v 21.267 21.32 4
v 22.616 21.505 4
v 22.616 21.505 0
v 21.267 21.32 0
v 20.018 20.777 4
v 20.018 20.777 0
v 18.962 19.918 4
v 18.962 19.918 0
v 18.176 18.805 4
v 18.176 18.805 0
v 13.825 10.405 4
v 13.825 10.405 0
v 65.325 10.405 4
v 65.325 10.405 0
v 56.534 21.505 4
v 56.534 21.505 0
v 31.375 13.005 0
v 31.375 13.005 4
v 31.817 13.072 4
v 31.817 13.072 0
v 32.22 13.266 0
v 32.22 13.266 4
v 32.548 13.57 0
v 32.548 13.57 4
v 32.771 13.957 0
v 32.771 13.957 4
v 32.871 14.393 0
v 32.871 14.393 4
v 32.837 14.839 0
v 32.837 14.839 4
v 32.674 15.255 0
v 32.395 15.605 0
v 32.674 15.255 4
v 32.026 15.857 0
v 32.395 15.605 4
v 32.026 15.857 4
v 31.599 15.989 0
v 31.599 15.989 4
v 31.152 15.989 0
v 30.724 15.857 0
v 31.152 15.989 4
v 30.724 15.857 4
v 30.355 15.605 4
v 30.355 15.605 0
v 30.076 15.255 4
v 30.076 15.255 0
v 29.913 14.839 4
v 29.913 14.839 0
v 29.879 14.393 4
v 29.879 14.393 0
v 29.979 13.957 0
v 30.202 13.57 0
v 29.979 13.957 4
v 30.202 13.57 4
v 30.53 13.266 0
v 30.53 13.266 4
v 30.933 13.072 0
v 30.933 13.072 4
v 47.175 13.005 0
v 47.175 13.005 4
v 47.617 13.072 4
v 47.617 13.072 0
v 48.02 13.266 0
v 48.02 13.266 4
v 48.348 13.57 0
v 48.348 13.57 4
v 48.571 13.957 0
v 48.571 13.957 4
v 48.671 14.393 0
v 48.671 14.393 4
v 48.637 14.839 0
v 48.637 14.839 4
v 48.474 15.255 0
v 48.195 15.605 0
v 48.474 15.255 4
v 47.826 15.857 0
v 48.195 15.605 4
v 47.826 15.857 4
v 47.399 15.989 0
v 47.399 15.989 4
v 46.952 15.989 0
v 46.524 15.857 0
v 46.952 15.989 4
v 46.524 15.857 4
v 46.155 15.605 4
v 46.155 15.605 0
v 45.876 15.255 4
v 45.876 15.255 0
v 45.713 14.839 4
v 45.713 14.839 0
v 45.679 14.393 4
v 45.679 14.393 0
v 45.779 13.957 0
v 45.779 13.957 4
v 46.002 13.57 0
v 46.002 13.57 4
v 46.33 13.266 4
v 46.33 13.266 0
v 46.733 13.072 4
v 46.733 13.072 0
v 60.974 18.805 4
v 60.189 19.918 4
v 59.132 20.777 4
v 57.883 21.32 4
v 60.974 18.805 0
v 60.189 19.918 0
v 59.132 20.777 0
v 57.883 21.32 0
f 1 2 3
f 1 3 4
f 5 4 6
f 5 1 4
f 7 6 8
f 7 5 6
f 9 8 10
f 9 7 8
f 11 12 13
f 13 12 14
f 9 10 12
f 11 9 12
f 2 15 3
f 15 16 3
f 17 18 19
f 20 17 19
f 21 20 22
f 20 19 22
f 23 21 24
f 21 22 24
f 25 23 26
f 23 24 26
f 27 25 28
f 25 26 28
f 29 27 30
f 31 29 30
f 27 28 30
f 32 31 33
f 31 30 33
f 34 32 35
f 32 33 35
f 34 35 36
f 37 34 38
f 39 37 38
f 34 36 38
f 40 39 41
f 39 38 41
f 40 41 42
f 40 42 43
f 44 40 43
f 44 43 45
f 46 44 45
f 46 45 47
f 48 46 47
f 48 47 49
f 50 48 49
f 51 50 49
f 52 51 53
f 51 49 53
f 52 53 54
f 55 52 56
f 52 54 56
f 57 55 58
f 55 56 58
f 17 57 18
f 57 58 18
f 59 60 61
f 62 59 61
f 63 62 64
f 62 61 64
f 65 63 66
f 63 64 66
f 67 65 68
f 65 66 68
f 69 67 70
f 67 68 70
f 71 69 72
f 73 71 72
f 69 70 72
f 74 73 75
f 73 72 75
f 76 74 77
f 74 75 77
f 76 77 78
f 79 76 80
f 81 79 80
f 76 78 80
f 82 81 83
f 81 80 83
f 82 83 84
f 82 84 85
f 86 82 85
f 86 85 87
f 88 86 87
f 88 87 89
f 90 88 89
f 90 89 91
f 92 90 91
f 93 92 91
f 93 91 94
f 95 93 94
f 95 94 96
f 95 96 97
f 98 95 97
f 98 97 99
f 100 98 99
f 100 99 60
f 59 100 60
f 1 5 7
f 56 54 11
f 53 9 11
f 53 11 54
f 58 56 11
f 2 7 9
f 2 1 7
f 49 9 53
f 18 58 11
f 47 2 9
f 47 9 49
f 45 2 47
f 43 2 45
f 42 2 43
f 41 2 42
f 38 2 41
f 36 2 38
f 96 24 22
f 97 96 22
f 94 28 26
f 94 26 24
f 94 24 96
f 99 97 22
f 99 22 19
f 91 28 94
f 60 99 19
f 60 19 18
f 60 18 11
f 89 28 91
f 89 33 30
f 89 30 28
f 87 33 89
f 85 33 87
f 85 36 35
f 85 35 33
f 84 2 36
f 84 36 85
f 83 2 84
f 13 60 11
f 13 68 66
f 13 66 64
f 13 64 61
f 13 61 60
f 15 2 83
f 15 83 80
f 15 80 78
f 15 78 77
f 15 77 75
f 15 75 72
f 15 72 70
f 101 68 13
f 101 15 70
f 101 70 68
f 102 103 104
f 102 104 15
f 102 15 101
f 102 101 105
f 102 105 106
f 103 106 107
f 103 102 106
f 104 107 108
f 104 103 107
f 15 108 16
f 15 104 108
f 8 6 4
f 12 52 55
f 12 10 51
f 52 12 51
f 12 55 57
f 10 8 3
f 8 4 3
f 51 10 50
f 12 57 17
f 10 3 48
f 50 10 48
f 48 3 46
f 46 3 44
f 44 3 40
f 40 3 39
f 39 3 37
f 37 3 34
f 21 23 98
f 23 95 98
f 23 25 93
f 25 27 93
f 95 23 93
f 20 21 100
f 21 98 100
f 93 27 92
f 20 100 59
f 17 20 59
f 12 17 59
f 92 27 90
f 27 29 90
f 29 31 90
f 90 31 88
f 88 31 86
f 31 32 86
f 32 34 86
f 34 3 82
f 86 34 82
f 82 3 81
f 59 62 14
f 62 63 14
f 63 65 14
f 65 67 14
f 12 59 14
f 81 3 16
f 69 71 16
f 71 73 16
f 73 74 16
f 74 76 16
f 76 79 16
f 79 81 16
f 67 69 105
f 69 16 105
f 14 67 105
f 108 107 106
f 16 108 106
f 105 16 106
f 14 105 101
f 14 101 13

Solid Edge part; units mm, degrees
sketch "Sketch1" plane through (0, 0, 0) normal (0, 0, 1) x (1, 0, 0)
  line L0 (13.8251, 10.4054) -> (65.3251, 10.4054)
  line L1 (59.5751, 21.5054) -> (65.3251, 10.4054)
  line L2 (39.5751, 21.5054) -> (59.5751, 21.5054)
  line L3 (39.5751, 21.5054) -> (19.5751, 21.5054)
  line L4 (19.5751, 21.5054) -> (13.8251, 10.4054)
extrude "Protrusion1" add sketch "Sketch1" along normal blind 4
hole "Furo_1" at (31.3751, 14.5054, 4) direction (0, 0, -1) diameter 3 end up to next
hole "Hole1" at (47.1751, 14.5054, 4) direction (0, 0, -1) diameter 3 end up to next
fillet "Redondo_1" radius 5 2 edges at (59.5751, 21.5054, 2) (19.5751, 21.5054, 2)
